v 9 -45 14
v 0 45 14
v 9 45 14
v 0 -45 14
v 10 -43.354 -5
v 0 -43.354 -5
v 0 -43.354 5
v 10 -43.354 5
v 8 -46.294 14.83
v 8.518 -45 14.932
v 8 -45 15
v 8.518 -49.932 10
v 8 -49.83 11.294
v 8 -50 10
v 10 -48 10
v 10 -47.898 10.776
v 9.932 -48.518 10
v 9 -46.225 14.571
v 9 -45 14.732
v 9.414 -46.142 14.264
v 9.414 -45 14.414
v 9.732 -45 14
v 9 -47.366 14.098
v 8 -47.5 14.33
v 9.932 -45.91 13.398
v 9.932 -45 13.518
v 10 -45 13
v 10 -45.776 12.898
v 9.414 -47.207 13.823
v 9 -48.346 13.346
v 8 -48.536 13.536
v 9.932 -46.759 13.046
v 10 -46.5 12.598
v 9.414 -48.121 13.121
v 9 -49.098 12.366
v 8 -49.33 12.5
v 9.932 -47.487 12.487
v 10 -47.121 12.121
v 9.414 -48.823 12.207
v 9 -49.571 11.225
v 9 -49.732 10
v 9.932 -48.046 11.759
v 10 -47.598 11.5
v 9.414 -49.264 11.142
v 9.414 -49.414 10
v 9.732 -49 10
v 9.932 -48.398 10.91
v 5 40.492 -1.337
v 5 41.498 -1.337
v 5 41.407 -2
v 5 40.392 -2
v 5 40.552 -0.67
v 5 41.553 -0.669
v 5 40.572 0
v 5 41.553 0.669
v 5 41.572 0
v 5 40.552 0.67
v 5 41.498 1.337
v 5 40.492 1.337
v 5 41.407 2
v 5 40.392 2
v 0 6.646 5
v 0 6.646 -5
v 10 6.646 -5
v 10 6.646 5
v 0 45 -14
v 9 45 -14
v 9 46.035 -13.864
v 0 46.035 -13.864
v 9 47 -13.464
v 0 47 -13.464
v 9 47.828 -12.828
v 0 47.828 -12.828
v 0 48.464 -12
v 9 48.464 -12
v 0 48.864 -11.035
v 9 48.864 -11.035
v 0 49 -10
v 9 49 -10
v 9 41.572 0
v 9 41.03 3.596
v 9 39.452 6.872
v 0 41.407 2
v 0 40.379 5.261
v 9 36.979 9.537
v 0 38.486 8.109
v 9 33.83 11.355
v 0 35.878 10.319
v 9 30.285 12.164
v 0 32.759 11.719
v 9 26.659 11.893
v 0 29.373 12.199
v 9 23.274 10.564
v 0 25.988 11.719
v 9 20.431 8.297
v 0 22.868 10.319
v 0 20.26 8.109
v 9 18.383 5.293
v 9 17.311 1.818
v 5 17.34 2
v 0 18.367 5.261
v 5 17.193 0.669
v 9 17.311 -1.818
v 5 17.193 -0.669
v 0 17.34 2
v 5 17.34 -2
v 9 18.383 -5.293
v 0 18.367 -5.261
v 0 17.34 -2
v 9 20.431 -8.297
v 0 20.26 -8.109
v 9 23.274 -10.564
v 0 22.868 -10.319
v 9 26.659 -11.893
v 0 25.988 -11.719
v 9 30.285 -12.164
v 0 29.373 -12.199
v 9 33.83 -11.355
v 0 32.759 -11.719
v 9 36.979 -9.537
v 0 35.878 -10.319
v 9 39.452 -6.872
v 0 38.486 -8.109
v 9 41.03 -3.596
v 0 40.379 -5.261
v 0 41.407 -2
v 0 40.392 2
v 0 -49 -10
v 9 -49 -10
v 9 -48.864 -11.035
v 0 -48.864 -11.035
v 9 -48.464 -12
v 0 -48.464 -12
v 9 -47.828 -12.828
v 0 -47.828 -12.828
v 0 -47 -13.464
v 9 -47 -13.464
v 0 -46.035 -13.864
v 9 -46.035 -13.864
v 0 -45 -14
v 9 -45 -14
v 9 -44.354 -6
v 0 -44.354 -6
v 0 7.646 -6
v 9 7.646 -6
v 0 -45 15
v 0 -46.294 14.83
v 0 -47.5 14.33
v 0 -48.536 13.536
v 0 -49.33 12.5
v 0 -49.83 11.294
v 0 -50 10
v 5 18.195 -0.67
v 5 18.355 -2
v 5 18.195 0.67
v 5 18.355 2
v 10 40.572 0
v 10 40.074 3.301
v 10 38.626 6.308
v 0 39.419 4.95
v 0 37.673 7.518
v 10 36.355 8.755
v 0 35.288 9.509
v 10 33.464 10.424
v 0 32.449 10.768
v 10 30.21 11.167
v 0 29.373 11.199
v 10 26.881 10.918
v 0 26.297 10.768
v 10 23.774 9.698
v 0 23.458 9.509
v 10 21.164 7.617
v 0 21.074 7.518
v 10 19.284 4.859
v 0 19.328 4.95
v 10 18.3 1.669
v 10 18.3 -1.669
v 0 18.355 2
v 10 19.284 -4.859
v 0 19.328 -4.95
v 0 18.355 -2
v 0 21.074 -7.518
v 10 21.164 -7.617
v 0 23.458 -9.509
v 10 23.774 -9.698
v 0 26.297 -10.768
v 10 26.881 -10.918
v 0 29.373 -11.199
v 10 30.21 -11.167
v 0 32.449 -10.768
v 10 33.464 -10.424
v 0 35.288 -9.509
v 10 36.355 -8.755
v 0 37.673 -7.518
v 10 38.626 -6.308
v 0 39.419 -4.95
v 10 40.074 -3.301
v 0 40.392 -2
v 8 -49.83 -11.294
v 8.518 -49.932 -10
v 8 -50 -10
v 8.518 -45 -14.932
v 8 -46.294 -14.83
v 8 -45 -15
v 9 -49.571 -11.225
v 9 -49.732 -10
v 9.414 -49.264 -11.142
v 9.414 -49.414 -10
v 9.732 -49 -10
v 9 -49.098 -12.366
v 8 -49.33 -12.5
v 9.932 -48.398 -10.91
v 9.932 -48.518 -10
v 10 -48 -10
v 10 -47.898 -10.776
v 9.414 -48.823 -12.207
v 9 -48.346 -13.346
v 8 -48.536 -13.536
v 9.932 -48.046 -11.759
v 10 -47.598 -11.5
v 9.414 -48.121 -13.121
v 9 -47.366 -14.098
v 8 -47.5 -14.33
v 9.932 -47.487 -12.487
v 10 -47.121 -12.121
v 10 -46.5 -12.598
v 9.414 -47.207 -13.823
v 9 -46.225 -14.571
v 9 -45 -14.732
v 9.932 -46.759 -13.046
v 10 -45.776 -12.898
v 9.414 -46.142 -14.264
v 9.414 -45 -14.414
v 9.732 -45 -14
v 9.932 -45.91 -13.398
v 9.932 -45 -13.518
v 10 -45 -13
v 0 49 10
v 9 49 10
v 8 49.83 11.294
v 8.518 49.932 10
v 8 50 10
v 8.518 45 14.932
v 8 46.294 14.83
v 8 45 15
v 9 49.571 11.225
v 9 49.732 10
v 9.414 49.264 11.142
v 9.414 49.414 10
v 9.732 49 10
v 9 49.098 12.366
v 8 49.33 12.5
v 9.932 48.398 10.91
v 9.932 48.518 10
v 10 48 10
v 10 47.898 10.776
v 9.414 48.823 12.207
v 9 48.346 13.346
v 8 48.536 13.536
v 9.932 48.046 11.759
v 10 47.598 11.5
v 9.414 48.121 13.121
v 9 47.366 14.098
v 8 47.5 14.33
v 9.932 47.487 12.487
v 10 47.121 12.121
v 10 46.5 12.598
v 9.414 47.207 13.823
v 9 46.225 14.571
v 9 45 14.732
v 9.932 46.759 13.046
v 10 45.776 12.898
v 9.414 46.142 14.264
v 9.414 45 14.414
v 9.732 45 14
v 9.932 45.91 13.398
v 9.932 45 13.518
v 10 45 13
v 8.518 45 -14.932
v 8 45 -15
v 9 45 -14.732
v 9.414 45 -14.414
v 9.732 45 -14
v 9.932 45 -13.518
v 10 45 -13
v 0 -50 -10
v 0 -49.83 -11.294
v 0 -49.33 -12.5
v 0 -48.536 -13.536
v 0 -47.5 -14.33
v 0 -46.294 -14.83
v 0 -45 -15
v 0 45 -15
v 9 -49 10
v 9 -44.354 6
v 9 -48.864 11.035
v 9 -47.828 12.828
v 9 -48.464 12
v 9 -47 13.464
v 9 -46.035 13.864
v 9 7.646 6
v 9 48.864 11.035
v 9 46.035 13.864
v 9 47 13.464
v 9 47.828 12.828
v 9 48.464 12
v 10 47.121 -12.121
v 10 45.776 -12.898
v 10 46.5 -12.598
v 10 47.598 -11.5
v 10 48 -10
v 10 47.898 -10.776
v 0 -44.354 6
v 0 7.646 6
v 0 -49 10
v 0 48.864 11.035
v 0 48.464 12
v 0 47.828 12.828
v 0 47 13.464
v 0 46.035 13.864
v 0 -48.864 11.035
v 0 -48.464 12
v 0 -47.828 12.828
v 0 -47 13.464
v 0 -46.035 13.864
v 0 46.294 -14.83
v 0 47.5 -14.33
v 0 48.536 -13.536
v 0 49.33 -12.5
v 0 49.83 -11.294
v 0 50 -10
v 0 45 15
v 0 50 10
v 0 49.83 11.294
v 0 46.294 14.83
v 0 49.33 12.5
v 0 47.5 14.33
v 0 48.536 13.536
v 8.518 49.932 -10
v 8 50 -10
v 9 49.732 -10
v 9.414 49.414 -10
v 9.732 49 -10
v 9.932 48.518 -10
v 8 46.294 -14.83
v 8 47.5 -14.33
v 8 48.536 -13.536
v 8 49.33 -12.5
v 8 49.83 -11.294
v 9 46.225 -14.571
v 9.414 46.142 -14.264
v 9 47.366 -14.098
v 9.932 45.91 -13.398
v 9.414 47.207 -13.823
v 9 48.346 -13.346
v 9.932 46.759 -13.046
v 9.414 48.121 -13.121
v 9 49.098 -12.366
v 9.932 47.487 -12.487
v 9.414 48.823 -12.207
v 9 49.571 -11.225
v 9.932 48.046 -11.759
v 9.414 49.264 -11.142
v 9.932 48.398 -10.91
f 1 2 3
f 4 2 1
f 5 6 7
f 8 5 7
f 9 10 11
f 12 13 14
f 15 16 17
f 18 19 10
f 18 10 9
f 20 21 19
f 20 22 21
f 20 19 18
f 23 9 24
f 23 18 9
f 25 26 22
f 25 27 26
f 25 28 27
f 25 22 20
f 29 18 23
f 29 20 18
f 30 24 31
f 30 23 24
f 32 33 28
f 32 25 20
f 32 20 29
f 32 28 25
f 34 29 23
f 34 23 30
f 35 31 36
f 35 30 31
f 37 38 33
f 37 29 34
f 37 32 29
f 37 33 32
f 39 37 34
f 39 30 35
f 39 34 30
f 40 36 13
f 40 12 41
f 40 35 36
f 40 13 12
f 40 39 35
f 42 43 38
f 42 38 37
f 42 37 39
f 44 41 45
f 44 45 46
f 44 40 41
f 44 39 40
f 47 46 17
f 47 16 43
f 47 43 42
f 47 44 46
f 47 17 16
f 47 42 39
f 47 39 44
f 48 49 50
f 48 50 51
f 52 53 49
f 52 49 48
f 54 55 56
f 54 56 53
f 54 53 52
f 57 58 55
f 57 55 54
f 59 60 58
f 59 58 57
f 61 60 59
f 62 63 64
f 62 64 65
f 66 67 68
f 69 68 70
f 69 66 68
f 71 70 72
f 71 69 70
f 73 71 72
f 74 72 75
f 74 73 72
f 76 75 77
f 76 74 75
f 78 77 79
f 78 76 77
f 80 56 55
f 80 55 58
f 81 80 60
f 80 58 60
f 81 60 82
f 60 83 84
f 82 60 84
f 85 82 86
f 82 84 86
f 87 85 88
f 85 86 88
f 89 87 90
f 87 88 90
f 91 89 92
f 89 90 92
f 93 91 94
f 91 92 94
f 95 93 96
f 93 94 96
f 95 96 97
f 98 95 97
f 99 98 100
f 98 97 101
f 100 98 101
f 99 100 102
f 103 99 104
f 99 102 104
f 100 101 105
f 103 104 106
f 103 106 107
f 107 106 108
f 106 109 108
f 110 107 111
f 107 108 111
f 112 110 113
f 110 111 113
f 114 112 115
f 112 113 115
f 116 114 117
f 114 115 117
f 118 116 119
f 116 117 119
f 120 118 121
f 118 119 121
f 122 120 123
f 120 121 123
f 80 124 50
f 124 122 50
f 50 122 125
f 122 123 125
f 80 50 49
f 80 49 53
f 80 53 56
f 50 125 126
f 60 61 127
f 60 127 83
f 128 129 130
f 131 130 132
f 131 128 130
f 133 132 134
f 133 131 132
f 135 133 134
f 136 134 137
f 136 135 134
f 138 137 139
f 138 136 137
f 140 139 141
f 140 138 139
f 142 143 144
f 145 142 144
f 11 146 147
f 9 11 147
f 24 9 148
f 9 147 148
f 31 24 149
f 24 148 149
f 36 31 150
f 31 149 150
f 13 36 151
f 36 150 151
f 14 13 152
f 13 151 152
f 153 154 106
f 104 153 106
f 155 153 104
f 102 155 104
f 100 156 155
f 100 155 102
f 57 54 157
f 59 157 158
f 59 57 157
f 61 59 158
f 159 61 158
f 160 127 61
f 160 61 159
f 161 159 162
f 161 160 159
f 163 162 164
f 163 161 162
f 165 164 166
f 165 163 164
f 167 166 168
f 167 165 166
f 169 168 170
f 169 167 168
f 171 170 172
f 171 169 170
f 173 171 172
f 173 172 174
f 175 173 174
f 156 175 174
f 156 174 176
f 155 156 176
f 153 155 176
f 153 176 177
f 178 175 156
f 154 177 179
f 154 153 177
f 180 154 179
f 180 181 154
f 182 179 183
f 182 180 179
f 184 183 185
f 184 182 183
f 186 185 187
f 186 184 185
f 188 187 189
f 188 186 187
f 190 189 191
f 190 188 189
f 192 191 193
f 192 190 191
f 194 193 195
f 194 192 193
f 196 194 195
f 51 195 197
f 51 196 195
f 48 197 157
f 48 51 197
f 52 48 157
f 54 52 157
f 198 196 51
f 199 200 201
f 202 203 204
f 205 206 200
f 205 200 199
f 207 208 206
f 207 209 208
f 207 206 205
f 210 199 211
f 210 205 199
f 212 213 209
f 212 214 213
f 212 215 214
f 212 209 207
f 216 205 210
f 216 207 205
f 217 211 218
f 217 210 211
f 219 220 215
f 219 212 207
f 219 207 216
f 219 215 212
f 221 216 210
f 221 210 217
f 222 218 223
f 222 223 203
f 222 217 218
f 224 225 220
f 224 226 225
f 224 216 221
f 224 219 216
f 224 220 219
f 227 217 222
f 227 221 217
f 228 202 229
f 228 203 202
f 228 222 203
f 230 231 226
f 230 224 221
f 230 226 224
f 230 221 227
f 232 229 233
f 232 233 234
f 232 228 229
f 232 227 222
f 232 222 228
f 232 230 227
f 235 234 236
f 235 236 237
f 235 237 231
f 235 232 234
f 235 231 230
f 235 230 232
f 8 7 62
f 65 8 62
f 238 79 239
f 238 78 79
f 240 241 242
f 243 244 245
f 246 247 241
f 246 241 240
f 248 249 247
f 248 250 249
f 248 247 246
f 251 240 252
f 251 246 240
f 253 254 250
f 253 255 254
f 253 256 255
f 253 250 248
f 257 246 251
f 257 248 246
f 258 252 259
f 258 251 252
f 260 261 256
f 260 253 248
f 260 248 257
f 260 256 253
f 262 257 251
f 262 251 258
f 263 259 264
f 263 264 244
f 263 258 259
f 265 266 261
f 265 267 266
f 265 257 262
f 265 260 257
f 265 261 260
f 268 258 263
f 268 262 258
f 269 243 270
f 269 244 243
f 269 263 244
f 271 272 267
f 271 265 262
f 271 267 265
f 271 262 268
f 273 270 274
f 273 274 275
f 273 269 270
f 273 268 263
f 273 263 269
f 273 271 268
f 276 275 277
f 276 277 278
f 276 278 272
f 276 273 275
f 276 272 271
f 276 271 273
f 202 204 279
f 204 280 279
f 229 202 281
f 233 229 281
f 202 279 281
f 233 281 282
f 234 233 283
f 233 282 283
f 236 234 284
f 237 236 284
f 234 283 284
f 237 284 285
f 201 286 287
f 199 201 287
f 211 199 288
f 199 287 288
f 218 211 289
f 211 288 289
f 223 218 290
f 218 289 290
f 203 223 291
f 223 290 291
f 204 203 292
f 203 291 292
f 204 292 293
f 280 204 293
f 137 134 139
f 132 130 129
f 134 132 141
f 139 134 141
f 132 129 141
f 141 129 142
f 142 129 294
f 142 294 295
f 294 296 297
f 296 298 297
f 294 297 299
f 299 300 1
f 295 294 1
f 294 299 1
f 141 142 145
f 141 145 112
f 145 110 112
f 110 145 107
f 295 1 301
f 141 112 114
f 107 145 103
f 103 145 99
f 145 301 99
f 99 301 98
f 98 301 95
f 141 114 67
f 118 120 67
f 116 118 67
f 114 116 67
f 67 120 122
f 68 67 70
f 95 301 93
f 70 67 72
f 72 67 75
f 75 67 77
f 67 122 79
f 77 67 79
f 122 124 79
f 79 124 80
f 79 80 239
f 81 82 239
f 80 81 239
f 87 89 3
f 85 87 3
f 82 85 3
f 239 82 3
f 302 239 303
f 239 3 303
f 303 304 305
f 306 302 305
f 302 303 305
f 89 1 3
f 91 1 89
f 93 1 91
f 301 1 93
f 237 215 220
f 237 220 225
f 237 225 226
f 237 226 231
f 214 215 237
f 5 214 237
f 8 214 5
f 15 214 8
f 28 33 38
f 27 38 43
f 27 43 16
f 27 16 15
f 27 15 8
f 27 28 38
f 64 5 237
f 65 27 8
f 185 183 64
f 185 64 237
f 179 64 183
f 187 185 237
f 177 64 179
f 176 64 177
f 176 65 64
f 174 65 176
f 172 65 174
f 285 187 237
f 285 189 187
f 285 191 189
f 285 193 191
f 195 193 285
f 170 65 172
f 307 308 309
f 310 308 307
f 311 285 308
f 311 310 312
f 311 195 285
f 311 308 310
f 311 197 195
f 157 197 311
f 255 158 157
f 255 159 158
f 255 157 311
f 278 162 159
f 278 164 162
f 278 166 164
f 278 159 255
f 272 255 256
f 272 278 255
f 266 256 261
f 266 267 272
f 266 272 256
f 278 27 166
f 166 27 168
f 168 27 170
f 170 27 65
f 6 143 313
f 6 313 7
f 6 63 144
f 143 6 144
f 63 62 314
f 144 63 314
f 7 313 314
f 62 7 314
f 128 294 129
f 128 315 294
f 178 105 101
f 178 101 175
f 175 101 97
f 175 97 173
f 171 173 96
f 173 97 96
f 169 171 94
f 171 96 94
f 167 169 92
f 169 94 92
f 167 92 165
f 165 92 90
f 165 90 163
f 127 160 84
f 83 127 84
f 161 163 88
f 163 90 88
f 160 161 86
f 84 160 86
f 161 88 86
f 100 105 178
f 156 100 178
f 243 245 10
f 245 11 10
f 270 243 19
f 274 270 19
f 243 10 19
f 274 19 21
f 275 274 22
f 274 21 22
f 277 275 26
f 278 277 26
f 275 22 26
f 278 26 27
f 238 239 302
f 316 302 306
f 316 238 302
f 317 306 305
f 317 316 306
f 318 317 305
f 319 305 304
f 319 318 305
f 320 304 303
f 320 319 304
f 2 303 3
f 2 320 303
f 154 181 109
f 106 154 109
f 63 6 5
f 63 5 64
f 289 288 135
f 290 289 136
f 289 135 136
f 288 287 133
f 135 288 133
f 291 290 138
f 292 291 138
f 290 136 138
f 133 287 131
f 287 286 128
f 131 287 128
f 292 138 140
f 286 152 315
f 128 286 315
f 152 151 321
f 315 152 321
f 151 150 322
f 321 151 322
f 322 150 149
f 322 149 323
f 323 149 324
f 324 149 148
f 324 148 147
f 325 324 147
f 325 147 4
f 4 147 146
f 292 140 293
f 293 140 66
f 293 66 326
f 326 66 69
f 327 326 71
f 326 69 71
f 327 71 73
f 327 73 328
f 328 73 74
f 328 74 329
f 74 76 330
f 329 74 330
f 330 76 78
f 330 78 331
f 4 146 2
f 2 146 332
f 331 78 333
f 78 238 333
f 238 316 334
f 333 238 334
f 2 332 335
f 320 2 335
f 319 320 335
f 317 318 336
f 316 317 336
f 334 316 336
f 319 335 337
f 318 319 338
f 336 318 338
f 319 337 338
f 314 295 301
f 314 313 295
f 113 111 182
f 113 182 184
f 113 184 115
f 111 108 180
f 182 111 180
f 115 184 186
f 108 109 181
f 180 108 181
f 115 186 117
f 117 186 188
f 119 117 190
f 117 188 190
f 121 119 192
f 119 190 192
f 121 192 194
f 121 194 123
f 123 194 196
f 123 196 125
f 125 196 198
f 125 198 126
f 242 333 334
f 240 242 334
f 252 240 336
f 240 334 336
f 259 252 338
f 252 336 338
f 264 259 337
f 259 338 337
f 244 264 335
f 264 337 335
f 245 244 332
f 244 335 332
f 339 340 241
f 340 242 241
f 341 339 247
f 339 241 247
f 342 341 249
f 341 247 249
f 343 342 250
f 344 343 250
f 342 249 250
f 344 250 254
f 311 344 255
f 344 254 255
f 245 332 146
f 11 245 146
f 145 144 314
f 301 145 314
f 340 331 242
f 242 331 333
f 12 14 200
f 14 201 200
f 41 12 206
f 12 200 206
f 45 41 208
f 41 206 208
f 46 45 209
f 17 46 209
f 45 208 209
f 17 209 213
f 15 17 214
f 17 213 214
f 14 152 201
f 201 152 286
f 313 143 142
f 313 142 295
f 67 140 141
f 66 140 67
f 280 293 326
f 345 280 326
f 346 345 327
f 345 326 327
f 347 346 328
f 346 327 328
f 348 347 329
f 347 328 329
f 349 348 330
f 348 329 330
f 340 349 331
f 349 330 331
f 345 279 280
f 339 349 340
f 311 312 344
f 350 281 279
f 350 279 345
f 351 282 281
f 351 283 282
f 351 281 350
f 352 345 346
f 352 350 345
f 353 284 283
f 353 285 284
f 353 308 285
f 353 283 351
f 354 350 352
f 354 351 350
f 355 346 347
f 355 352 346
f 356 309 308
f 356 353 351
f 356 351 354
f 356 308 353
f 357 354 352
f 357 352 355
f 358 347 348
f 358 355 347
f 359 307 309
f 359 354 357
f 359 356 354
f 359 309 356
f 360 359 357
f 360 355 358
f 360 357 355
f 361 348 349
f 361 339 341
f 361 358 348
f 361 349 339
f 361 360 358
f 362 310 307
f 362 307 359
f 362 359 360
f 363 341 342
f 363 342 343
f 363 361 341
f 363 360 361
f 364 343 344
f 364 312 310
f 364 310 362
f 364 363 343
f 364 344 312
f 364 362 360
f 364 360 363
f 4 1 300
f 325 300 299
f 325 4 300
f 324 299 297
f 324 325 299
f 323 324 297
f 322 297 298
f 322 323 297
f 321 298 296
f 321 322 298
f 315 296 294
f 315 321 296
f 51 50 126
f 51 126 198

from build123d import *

# Parameters (mm, degrees)
F0_W     = 50
F0_H     = 10
F0_R     = 11.1985350655
F1_DEPTH = 10
F2_T     = -1
F3_R     = 2
F5_DEPTH = 5


with BuildPart() as f1:
    # F0 (on Right) → F1 (new body)
    with BuildSketch(Plane.YZ):
        with BuildLine():
            ThreePointArc((-50, -10), (-48.5355339059, -13.5355339059), (-45, -15))
            Line((-45, -15), (45, -15))
            ThreePointArc((45, -15), (48.5355339059, -13.5355339059), (50, -10))
            Line((50, -10), (50, 10))
            ThreePointArc((50, 10), (48.5355339059, 13.5355339059), (45, 15))
            Line((45, 15), (-45, 15))
            ThreePointArc((-45, 15), (-48.5355339059, 13.5355339059), (-50, 10))
            Line((-50, 10), (-50, -10))
        make_face()
        with Locations((-18.3541104198, 0)):
            Rectangle(F0_W, F0_H, mode=Mode.SUBTRACT)
        with Locations((29.37316522, 0)):
            Circle(F0_R, mode=Mode.SUBTRACT)
    extrude(amount=F1_DEPTH)

    # F2
    f2_openings = [f1.faces().sort_by_distance(p)[0] for p in [
        (0, -47.797293, 12.797293),
    ]]
    offset(amount=F2_T, openings=f2_openings, kind=Kind.INTERSECTION)

    # F3
    f3_edges = [f1.edges().sort_by_distance(p)[0] for p in [
        (10, 0, -15),
        (10, -48.535534, 13.535534),
        (10, -50, 0),
        (10, -48.535534, -13.535534),
        (10, 48.535534, -13.535534),
        (10, 50, 0),
        (10, 48.535534, 13.535534),
        (10, 0, 15),
    ]]
    fillet(f3_edges, radius=F3_R)

    # F4 (on face) → F5 (cut)
    with BuildSketch(Plane(origin=(0, 0, 0), x_dir=(0, -1, 0), z_dir=(-1, 0, 0))):
        with BuildLine():
            Line((-41.4066292992, 2), (-43.37316522, 2))
            Line((-43.37316522, 2), (-43.37316522, -2))
            Line((-43.37316522, -2), (-41.4066292992, -2))
            ThreePointArc((-41.4066292992, -2), (-41.5717002855, 0), (-41.4066292992, 2))
        make_face()
        with BuildLine():
            Line((-40.3916582029, 2), (-41.4066292992, 2))
            ThreePointArc((-41.4066292992, 2), (-41.5717002855, 0), (-41.4066292992, -2))
            Line((-41.4066292992, -2), (-40.3916582029, -2))
            ThreePointArc((-40.3916582029, -2), (-40.5717002855, 0), (-40.3916582029, 2))
        make_face()
        with BuildLine():
            Line((-18.3546722372, 2), (-40.3916582029, 2))
            ThreePointArc((-40.3916582029, 2), (-40.5717002855, 0), (-40.3916582029, -2))
            Line((-40.3916582029, -2), (-18.3546722372, -2))
            ThreePointArc((-18.3546722372, -2), (-18.2197314965, -1.0040437181), (-18.1746301545, 0))
            ThreePointArc((-18.1746301545, 0), (-18.2197314965, 1.0040437181), (-18.3546722372, 2))
        make_face()
        with BuildLine():
            ThreePointArc((-17.1746301545, 0), (-17.2159679428, 1.0034002729), (-17.3397011409, 2))
            Line((-17.3397011409, 2), (-18.3546722372, 2))
            ThreePointArc((-18.3546722372, 2), (-18.2197314965, 1.0040437181), (-18.1746301545, 0))
            ThreePointArc((-18.1746301545, 0), (-18.2197314965, -1.0040437181), (-18.3546722372, -2))
            Line((-18.3546722372, -2), (-17.3397011409, -2))
            ThreePointArc((-17.3397011409, -2), (-17.2159679428, -1.0034002729), (-17.1746301545, 0))
        make_face()
        with BuildLine():
            Line((-15.37316522, 2), (-17.3397011409, 2))
            ThreePointArc((-17.3397011409, 2), (-17.2159679428, 1.0034002729), (-17.1746301545, 0))
            ThreePointArc((-17.1746301545, 0), (-17.2159679428, -1.0034002729), (-17.3397011409, -2))
            Line((-17.3397011409, -2), (-15.37316522, -2))
            Line((-15.37316522, -2), (-15.37316522, 2))
        make_face()
    extrude(amount=-F5_DEPTH, mode=Mode.SUBTRACT)


solid = f1.part
